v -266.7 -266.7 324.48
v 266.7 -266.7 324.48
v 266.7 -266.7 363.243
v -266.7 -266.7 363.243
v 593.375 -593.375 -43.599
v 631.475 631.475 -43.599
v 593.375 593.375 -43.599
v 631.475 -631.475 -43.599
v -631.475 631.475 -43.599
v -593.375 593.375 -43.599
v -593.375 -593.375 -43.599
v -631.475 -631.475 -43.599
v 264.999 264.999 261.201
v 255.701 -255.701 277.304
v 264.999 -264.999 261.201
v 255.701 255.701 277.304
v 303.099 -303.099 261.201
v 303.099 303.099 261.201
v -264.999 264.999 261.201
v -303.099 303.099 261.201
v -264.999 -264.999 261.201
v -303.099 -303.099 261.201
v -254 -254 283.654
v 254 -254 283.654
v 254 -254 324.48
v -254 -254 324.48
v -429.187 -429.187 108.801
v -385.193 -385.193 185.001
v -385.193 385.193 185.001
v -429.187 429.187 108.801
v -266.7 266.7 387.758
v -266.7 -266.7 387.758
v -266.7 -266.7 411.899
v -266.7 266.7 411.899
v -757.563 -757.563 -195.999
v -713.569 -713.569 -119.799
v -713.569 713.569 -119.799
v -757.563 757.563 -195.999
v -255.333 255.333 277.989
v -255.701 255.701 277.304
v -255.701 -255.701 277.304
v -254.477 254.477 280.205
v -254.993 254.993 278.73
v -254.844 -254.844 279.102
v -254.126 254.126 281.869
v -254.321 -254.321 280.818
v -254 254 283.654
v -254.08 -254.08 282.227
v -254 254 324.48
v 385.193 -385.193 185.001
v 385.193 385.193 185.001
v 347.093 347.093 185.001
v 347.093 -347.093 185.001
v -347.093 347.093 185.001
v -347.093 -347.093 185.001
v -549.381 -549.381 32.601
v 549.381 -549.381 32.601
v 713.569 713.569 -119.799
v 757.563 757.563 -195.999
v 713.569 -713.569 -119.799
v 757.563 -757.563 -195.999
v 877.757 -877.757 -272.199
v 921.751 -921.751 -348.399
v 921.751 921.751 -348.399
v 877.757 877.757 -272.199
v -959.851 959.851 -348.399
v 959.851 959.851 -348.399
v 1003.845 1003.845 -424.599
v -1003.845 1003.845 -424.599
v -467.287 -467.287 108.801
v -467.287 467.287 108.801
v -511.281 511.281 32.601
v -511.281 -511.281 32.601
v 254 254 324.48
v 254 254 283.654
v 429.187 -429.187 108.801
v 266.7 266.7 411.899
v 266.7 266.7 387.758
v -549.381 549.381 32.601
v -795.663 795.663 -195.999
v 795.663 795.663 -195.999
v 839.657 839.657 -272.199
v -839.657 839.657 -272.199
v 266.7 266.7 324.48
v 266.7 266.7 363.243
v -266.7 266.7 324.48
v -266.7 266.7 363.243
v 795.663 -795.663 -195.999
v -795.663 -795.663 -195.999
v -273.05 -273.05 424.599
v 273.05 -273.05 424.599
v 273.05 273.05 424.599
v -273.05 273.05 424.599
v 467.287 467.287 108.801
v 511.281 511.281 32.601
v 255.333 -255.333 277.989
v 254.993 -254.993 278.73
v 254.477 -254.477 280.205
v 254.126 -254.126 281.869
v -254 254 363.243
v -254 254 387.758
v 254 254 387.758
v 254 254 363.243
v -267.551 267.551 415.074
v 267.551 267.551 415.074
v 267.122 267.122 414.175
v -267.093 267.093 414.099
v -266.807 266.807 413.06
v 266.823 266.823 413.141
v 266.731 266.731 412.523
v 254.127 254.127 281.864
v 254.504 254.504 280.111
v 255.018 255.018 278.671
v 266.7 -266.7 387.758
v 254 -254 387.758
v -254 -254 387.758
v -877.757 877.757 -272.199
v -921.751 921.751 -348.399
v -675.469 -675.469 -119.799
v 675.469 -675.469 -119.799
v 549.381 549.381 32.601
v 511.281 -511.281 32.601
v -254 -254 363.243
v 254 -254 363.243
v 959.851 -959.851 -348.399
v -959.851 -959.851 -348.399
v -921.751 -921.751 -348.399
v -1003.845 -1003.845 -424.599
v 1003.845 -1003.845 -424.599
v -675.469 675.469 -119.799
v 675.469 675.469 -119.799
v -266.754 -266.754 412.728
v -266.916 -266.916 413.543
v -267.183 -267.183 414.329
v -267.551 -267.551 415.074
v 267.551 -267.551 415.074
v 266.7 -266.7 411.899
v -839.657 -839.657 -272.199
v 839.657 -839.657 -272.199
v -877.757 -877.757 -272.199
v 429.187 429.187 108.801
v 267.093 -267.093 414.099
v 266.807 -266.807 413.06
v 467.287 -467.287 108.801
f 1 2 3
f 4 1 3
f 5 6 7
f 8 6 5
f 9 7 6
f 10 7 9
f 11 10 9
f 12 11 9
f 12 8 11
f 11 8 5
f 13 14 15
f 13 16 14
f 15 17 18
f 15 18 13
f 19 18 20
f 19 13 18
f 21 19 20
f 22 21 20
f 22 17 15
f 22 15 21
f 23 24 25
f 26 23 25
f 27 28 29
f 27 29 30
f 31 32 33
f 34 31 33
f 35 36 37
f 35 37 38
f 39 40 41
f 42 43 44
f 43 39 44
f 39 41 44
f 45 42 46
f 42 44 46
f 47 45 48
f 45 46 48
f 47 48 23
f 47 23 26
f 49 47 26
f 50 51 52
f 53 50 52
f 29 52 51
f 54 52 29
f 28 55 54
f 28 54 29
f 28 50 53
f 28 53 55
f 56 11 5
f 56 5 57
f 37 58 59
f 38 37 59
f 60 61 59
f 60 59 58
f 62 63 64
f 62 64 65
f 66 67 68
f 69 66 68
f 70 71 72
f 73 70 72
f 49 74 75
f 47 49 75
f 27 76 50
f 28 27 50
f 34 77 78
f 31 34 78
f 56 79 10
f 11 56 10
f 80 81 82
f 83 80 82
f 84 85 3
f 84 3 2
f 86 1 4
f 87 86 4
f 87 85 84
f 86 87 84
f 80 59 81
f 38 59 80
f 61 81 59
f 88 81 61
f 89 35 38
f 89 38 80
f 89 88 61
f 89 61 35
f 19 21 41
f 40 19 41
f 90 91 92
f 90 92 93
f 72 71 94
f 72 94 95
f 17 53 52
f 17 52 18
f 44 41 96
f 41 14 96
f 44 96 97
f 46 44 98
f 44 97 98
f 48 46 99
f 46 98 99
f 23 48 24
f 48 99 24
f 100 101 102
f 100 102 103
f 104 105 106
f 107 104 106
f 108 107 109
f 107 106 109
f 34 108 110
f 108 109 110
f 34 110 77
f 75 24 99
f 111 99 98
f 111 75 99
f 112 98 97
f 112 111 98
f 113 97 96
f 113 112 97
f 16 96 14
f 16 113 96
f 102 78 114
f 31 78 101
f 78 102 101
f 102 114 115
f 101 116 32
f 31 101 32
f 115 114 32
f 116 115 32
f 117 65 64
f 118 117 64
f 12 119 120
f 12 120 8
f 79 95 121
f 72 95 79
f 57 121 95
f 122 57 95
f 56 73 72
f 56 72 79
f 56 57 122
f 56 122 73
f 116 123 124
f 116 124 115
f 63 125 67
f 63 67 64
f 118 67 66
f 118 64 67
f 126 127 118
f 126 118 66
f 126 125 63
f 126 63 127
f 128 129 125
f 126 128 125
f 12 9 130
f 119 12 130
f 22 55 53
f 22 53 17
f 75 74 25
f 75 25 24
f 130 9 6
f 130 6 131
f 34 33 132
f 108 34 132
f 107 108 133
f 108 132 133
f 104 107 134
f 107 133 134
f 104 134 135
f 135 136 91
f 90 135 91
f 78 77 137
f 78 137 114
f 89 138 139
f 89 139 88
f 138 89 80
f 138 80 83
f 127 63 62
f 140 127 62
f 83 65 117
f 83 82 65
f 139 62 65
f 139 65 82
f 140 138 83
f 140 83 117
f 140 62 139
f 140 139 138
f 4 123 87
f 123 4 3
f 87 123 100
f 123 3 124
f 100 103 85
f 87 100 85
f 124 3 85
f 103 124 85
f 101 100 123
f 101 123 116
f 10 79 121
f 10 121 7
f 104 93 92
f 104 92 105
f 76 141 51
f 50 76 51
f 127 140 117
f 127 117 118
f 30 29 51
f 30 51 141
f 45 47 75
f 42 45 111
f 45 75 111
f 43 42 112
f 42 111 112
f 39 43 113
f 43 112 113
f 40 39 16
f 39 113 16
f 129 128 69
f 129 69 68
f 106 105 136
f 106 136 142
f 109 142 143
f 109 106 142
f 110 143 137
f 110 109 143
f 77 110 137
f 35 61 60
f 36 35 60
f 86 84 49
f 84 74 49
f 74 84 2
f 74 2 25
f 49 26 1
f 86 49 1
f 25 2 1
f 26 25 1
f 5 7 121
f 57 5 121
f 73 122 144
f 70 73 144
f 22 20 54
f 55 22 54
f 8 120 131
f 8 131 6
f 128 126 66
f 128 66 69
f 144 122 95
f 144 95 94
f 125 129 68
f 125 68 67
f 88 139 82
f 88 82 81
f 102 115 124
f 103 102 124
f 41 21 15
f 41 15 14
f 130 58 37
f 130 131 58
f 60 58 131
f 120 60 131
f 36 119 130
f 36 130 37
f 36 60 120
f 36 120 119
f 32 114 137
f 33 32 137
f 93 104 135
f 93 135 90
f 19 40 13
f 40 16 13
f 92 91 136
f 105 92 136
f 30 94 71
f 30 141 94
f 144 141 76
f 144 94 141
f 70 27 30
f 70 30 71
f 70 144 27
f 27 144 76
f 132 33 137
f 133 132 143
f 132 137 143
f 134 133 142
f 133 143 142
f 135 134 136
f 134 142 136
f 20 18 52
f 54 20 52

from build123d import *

# Parameters (mm, degrees)
F3_DEPTH  = 1003.8461
F4_W      = 2548.7215518951
F4_H      = 1253.2386779785
F5_DEPTH  = 1003.8461
F8_DEPTH  = 273.05
F10_DEPTH = 546.1
F12_DEPTH = 273.05


# Not quite as in the source:
# - ends of sketch curves that miss each other by under 0.0002 mm in the source are joined


with BuildPart() as f3:
    # F2 (on Front) → F3 (new body, symmetric)
    with BuildSketch(Plane.XZ):
        Polygon((-959.8512426, -348.3992524), (-1003.845338, -424.5992524), (76.2, -424.5992524), (1003.845338, -424.5992524), (959.8512426, -348.3992524), (921.7512426, -348.3992524), (877.7571472, -272.1992524), (839.6571472, -272.1992524), (795.6630772, -195.9992524), (757.5630772, -195.9992524), (713.5689818, -119.7992524), (675.4689818, -119.7992524), (631.4748864, -43.5992524), (593.3748864, -43.5992524), (549.380791, 32.6007476), (511.280791, 32.6007476), (467.2866956, 108.8007476), (429.1866956, 108.8007476), (385.1926002, 185.0007476), (347.0926002, 185.0007476), (303.0985302, 261.2007476), (264.9985302, 261.2007476), (-264.9985302, 261.2007476), (-303.0985302, 261.2007476), (-347.0926256, 185.0007476), (-385.1926256, 185.0007476), (-429.1866956, 108.8007476), (-467.2866956, 108.8007476), (-511.280791, 32.6007476), (-549.380791, 32.6007476), (-593.3748864, -43.5992524), (-631.4748864, -43.5992524), (-675.4689818, -119.7992524), (-713.5689818, -119.7992524), (-757.5630772, -195.9992524), (-795.6630772, -195.9992524), (-839.6571472, -272.1992524), (-877.7571472, -272.1992524), (-921.7512426, -348.3992524), align=None)
    extrude(amount=F3_DEPTH, both=True)

    # F4 (on Right) → F5 (cut, symmetric)
    with BuildSketch(Plane.YZ):
        with Locations((-39.1746759415, -156.0024023056)):
            Rectangle(F4_W, F4_H)
        Polygon((1003.845338, -424.5992524), (76.2, -424.5992524), (-1003.845338, -424.5992524), (-959.8512426, -348.3992524), (-921.7512426, -348.3992524), (-877.7571472, -272.1992524), (-839.6571472, -272.1992524), (-795.6630772, -195.9992524), (-757.5630772, -195.9992524), (-713.5689818, -119.7992524), (-675.4689818, -119.7992524), (-631.4748864, -43.5992524), (-593.3748864, -43.5992524), (-549.380791, 32.6007476), (-511.280791, 32.6007476), (-467.2866956, 108.8007476), (-429.1866956, 108.8007476), (-385.1926256, 185.0007476), (-347.0926256, 185.0007476), (-303.0985302, 261.2007476), (-264.9985302, 261.2007476), (264.9985302, 261.2007476), (303.0985302, 261.2007476), (347.0926002, 185.0007476), (385.1926002, 185.0007476), (429.1866956, 108.8007476), (467.2866956, 108.8007476), (511.280791, 32.6007476), (549.380791, 32.6007476), (593.3748864, -43.5992524), (631.4748864, -43.5992524), (675.4689818, -119.7992524), (713.5689818, -119.7992524), (757.5630772, -195.9992524), (795.6630772, -195.9992524), (839.6571472, -272.1992524), (877.7571472, -272.1992524), (921.7512426, -348.3992524), (959.8512426, -348.3992524), align=None, mode=Mode.SUBTRACT)
    extrude(amount=F5_DEPTH, both=True, mode=Mode.SUBTRACT)

    # F6 (on Front) → F8 (join, symmetric)
    with BuildSketch(Plane.XZ):
        Polygon((273.05, 261.2007476), (273.05, 424.5992778), (-273.05, 424.5992778), (-273.05, 261.2007476), (-264.9985302, 261.2007476), (264.9985302, 261.2007476), align=None)
    extrude(amount=F8_DEPTH, both=True)

    # F9 (on face) → F10 (cut, through all)
    with BuildSketch(Plane.YZ.offset(273.05)):
        with BuildLine():
            Line((273.05, 424.5992778), (267.5507476, 415.0742778))
            ThreePointArc((267.5507476, 415.0742778), (266.9163715798, 413.542780889), (266.7, 411.8992778))
            Line((266.7, 411.8992778), (266.7, 404.489539))
            Line((266.7, 404.489539), (266.7, 387.7583304))
            Line((266.7, 387.7583304), (254, 387.7583304))
            Line((254, 387.7583304), (254, 363.2431648))
            Line((254, 363.2431648), (266.7, 363.2431648))
            Line((266.7, 363.2431648), (266.7, 354.1319562))
            Line((266.7, 354.1319562), (266.7, 324.479539))
            Line((266.7, 324.479539), (254, 324.479539))
            Line((254, 324.479539), (254, 283.6537126))
            ThreePointArc((254, 283.6537126), (254.4327415162, 280.3667125557), (255.701475479, 277.3037158787))
            Line((255.701475479, 277.3037158787), (264.9985302, 261.2007476))
            Line((264.9985302, 261.2007476), (273.05, 261.2007476))
            Line((273.05, 261.2007476), (273.05, 424.5992778))
        make_face()
        with BuildLine():
            Line((-264.9985302, 261.2007476), (-255.7014698, 277.3037126))
            ThreePointArc((-255.7014698, 277.3037126), (-254.4327415162, 280.3667125557), (-254, 283.6537126))
            Line((-254, 283.6537126), (-254, 324.479539))
            Line((-254, 324.479539), (-266.7, 324.479539))
            Line((-266.7, 324.479539), (-266.7, 354.1319562))
            Line((-266.7, 354.1319562), (-266.7, 363.2431648))
            Line((-266.7, 363.2431648), (-254, 363.2431648))
            Line((-254, 363.2431648), (-254, 387.7583304))
            Line((-254, 387.7583304), (-266.7, 387.7583304))
            Line((-266.7, 387.7583304), (-266.7, 404.489539))
            Line((-266.7, 404.489539), (-266.7, 411.8992778))
            ThreePointArc((-266.7, 411.8992778), (-266.9163715798, 413.542780889), (-267.5507409145, 415.0742816599))
            Line((-267.5507409145, 415.0742816599), (-273.05, 424.5992778))
            Line((-273.05, 424.5992778), (-273.05, 261.2007476))
            Line((-273.05, 261.2007476), (-264.9985302, 261.2007476))
        make_face()
    extrude(amount=-F10_DEPTH, mode=Mode.SUBTRACT)

    # F11 (on Front) → F12 (cut, symmetric)
    with BuildSketch(Plane.XZ):
        with BuildLine():
            ThreePointArc((254, 283.6537126), (254.4327415162, 280.3667125557), (255.701475479, 277.3037158787))
            Line((255.701475479, 277.3037158787), (264.9985302, 261.2007476))
            Line((264.9985302, 261.2007476), (273.05, 261.2007476))
            Line((273.05, 261.2007476), (273.05, 424.5992778))
            Line((273.05, 424.5992778), (267.5507476, 415.0742778))
            ThreePointArc((267.5507476, 415.0742778), (266.9163715798, 413.542780889), (266.7, 411.8992778))
            Line((266.7, 411.8992778), (266.7, 404.489539))
            Line((266.7, 404.489539), (266.7, 387.7583304))
            Line((266.7, 387.7583304), (254, 387.7583304))
            Line((254, 387.7583304), (254, 363.2431648))
            Line((254, 363.2431648), (266.7, 363.2431648))
            Line((266.7, 363.2431648), (266.7, 354.1319562))
            Line((266.7, 354.1319562), (266.7, 324.479539))
            Line((266.7, 324.479539), (254, 324.479539))
            Line((254, 324.479539), (254, 283.6537126))
        make_face()
        with BuildLine():
            ThreePointArc((-266.7, 411.8992778), (-266.9163715798, 413.542780889), (-267.5507409145, 415.0742816599))
            Line((-267.5507409145, 415.0742816599), (-273.05, 424.5992778))
            Line((-273.05, 424.5992778), (-273.05, 261.2007476))
            Line((-273.05, 261.2007476), (-264.9985302, 261.2007476))
            Line((-264.9985302, 261.2007476), (-255.7014698, 277.3037126))
            ThreePointArc((-255.7014698, 277.3037126), (-254.4327415162, 280.3667125557), (-254, 283.6537126))
            Line((-254, 283.6537126), (-254, 324.479539))
            Line((-254, 324.479539), (-266.7, 324.479539))
            Line((-266.7, 324.479539), (-266.7, 354.1319562))
            Line((-266.7, 354.1319562), (-266.7, 363.2431648))
            Line((-266.7, 363.2431648), (-254, 363.2431648))
            Line((-254, 363.2431648), (-254, 387.7583304))
            Line((-254, 387.7583304), (-266.7, 387.7583304))
            Line((-266.7, 387.7583304), (-266.7, 404.489539))
            Line((-266.7, 404.489539), (-266.7, 411.8992778))
        make_face()
    extrude(amount=F12_DEPTH, both=True, mode=Mode.SUBTRACT)


solid = f3.part
